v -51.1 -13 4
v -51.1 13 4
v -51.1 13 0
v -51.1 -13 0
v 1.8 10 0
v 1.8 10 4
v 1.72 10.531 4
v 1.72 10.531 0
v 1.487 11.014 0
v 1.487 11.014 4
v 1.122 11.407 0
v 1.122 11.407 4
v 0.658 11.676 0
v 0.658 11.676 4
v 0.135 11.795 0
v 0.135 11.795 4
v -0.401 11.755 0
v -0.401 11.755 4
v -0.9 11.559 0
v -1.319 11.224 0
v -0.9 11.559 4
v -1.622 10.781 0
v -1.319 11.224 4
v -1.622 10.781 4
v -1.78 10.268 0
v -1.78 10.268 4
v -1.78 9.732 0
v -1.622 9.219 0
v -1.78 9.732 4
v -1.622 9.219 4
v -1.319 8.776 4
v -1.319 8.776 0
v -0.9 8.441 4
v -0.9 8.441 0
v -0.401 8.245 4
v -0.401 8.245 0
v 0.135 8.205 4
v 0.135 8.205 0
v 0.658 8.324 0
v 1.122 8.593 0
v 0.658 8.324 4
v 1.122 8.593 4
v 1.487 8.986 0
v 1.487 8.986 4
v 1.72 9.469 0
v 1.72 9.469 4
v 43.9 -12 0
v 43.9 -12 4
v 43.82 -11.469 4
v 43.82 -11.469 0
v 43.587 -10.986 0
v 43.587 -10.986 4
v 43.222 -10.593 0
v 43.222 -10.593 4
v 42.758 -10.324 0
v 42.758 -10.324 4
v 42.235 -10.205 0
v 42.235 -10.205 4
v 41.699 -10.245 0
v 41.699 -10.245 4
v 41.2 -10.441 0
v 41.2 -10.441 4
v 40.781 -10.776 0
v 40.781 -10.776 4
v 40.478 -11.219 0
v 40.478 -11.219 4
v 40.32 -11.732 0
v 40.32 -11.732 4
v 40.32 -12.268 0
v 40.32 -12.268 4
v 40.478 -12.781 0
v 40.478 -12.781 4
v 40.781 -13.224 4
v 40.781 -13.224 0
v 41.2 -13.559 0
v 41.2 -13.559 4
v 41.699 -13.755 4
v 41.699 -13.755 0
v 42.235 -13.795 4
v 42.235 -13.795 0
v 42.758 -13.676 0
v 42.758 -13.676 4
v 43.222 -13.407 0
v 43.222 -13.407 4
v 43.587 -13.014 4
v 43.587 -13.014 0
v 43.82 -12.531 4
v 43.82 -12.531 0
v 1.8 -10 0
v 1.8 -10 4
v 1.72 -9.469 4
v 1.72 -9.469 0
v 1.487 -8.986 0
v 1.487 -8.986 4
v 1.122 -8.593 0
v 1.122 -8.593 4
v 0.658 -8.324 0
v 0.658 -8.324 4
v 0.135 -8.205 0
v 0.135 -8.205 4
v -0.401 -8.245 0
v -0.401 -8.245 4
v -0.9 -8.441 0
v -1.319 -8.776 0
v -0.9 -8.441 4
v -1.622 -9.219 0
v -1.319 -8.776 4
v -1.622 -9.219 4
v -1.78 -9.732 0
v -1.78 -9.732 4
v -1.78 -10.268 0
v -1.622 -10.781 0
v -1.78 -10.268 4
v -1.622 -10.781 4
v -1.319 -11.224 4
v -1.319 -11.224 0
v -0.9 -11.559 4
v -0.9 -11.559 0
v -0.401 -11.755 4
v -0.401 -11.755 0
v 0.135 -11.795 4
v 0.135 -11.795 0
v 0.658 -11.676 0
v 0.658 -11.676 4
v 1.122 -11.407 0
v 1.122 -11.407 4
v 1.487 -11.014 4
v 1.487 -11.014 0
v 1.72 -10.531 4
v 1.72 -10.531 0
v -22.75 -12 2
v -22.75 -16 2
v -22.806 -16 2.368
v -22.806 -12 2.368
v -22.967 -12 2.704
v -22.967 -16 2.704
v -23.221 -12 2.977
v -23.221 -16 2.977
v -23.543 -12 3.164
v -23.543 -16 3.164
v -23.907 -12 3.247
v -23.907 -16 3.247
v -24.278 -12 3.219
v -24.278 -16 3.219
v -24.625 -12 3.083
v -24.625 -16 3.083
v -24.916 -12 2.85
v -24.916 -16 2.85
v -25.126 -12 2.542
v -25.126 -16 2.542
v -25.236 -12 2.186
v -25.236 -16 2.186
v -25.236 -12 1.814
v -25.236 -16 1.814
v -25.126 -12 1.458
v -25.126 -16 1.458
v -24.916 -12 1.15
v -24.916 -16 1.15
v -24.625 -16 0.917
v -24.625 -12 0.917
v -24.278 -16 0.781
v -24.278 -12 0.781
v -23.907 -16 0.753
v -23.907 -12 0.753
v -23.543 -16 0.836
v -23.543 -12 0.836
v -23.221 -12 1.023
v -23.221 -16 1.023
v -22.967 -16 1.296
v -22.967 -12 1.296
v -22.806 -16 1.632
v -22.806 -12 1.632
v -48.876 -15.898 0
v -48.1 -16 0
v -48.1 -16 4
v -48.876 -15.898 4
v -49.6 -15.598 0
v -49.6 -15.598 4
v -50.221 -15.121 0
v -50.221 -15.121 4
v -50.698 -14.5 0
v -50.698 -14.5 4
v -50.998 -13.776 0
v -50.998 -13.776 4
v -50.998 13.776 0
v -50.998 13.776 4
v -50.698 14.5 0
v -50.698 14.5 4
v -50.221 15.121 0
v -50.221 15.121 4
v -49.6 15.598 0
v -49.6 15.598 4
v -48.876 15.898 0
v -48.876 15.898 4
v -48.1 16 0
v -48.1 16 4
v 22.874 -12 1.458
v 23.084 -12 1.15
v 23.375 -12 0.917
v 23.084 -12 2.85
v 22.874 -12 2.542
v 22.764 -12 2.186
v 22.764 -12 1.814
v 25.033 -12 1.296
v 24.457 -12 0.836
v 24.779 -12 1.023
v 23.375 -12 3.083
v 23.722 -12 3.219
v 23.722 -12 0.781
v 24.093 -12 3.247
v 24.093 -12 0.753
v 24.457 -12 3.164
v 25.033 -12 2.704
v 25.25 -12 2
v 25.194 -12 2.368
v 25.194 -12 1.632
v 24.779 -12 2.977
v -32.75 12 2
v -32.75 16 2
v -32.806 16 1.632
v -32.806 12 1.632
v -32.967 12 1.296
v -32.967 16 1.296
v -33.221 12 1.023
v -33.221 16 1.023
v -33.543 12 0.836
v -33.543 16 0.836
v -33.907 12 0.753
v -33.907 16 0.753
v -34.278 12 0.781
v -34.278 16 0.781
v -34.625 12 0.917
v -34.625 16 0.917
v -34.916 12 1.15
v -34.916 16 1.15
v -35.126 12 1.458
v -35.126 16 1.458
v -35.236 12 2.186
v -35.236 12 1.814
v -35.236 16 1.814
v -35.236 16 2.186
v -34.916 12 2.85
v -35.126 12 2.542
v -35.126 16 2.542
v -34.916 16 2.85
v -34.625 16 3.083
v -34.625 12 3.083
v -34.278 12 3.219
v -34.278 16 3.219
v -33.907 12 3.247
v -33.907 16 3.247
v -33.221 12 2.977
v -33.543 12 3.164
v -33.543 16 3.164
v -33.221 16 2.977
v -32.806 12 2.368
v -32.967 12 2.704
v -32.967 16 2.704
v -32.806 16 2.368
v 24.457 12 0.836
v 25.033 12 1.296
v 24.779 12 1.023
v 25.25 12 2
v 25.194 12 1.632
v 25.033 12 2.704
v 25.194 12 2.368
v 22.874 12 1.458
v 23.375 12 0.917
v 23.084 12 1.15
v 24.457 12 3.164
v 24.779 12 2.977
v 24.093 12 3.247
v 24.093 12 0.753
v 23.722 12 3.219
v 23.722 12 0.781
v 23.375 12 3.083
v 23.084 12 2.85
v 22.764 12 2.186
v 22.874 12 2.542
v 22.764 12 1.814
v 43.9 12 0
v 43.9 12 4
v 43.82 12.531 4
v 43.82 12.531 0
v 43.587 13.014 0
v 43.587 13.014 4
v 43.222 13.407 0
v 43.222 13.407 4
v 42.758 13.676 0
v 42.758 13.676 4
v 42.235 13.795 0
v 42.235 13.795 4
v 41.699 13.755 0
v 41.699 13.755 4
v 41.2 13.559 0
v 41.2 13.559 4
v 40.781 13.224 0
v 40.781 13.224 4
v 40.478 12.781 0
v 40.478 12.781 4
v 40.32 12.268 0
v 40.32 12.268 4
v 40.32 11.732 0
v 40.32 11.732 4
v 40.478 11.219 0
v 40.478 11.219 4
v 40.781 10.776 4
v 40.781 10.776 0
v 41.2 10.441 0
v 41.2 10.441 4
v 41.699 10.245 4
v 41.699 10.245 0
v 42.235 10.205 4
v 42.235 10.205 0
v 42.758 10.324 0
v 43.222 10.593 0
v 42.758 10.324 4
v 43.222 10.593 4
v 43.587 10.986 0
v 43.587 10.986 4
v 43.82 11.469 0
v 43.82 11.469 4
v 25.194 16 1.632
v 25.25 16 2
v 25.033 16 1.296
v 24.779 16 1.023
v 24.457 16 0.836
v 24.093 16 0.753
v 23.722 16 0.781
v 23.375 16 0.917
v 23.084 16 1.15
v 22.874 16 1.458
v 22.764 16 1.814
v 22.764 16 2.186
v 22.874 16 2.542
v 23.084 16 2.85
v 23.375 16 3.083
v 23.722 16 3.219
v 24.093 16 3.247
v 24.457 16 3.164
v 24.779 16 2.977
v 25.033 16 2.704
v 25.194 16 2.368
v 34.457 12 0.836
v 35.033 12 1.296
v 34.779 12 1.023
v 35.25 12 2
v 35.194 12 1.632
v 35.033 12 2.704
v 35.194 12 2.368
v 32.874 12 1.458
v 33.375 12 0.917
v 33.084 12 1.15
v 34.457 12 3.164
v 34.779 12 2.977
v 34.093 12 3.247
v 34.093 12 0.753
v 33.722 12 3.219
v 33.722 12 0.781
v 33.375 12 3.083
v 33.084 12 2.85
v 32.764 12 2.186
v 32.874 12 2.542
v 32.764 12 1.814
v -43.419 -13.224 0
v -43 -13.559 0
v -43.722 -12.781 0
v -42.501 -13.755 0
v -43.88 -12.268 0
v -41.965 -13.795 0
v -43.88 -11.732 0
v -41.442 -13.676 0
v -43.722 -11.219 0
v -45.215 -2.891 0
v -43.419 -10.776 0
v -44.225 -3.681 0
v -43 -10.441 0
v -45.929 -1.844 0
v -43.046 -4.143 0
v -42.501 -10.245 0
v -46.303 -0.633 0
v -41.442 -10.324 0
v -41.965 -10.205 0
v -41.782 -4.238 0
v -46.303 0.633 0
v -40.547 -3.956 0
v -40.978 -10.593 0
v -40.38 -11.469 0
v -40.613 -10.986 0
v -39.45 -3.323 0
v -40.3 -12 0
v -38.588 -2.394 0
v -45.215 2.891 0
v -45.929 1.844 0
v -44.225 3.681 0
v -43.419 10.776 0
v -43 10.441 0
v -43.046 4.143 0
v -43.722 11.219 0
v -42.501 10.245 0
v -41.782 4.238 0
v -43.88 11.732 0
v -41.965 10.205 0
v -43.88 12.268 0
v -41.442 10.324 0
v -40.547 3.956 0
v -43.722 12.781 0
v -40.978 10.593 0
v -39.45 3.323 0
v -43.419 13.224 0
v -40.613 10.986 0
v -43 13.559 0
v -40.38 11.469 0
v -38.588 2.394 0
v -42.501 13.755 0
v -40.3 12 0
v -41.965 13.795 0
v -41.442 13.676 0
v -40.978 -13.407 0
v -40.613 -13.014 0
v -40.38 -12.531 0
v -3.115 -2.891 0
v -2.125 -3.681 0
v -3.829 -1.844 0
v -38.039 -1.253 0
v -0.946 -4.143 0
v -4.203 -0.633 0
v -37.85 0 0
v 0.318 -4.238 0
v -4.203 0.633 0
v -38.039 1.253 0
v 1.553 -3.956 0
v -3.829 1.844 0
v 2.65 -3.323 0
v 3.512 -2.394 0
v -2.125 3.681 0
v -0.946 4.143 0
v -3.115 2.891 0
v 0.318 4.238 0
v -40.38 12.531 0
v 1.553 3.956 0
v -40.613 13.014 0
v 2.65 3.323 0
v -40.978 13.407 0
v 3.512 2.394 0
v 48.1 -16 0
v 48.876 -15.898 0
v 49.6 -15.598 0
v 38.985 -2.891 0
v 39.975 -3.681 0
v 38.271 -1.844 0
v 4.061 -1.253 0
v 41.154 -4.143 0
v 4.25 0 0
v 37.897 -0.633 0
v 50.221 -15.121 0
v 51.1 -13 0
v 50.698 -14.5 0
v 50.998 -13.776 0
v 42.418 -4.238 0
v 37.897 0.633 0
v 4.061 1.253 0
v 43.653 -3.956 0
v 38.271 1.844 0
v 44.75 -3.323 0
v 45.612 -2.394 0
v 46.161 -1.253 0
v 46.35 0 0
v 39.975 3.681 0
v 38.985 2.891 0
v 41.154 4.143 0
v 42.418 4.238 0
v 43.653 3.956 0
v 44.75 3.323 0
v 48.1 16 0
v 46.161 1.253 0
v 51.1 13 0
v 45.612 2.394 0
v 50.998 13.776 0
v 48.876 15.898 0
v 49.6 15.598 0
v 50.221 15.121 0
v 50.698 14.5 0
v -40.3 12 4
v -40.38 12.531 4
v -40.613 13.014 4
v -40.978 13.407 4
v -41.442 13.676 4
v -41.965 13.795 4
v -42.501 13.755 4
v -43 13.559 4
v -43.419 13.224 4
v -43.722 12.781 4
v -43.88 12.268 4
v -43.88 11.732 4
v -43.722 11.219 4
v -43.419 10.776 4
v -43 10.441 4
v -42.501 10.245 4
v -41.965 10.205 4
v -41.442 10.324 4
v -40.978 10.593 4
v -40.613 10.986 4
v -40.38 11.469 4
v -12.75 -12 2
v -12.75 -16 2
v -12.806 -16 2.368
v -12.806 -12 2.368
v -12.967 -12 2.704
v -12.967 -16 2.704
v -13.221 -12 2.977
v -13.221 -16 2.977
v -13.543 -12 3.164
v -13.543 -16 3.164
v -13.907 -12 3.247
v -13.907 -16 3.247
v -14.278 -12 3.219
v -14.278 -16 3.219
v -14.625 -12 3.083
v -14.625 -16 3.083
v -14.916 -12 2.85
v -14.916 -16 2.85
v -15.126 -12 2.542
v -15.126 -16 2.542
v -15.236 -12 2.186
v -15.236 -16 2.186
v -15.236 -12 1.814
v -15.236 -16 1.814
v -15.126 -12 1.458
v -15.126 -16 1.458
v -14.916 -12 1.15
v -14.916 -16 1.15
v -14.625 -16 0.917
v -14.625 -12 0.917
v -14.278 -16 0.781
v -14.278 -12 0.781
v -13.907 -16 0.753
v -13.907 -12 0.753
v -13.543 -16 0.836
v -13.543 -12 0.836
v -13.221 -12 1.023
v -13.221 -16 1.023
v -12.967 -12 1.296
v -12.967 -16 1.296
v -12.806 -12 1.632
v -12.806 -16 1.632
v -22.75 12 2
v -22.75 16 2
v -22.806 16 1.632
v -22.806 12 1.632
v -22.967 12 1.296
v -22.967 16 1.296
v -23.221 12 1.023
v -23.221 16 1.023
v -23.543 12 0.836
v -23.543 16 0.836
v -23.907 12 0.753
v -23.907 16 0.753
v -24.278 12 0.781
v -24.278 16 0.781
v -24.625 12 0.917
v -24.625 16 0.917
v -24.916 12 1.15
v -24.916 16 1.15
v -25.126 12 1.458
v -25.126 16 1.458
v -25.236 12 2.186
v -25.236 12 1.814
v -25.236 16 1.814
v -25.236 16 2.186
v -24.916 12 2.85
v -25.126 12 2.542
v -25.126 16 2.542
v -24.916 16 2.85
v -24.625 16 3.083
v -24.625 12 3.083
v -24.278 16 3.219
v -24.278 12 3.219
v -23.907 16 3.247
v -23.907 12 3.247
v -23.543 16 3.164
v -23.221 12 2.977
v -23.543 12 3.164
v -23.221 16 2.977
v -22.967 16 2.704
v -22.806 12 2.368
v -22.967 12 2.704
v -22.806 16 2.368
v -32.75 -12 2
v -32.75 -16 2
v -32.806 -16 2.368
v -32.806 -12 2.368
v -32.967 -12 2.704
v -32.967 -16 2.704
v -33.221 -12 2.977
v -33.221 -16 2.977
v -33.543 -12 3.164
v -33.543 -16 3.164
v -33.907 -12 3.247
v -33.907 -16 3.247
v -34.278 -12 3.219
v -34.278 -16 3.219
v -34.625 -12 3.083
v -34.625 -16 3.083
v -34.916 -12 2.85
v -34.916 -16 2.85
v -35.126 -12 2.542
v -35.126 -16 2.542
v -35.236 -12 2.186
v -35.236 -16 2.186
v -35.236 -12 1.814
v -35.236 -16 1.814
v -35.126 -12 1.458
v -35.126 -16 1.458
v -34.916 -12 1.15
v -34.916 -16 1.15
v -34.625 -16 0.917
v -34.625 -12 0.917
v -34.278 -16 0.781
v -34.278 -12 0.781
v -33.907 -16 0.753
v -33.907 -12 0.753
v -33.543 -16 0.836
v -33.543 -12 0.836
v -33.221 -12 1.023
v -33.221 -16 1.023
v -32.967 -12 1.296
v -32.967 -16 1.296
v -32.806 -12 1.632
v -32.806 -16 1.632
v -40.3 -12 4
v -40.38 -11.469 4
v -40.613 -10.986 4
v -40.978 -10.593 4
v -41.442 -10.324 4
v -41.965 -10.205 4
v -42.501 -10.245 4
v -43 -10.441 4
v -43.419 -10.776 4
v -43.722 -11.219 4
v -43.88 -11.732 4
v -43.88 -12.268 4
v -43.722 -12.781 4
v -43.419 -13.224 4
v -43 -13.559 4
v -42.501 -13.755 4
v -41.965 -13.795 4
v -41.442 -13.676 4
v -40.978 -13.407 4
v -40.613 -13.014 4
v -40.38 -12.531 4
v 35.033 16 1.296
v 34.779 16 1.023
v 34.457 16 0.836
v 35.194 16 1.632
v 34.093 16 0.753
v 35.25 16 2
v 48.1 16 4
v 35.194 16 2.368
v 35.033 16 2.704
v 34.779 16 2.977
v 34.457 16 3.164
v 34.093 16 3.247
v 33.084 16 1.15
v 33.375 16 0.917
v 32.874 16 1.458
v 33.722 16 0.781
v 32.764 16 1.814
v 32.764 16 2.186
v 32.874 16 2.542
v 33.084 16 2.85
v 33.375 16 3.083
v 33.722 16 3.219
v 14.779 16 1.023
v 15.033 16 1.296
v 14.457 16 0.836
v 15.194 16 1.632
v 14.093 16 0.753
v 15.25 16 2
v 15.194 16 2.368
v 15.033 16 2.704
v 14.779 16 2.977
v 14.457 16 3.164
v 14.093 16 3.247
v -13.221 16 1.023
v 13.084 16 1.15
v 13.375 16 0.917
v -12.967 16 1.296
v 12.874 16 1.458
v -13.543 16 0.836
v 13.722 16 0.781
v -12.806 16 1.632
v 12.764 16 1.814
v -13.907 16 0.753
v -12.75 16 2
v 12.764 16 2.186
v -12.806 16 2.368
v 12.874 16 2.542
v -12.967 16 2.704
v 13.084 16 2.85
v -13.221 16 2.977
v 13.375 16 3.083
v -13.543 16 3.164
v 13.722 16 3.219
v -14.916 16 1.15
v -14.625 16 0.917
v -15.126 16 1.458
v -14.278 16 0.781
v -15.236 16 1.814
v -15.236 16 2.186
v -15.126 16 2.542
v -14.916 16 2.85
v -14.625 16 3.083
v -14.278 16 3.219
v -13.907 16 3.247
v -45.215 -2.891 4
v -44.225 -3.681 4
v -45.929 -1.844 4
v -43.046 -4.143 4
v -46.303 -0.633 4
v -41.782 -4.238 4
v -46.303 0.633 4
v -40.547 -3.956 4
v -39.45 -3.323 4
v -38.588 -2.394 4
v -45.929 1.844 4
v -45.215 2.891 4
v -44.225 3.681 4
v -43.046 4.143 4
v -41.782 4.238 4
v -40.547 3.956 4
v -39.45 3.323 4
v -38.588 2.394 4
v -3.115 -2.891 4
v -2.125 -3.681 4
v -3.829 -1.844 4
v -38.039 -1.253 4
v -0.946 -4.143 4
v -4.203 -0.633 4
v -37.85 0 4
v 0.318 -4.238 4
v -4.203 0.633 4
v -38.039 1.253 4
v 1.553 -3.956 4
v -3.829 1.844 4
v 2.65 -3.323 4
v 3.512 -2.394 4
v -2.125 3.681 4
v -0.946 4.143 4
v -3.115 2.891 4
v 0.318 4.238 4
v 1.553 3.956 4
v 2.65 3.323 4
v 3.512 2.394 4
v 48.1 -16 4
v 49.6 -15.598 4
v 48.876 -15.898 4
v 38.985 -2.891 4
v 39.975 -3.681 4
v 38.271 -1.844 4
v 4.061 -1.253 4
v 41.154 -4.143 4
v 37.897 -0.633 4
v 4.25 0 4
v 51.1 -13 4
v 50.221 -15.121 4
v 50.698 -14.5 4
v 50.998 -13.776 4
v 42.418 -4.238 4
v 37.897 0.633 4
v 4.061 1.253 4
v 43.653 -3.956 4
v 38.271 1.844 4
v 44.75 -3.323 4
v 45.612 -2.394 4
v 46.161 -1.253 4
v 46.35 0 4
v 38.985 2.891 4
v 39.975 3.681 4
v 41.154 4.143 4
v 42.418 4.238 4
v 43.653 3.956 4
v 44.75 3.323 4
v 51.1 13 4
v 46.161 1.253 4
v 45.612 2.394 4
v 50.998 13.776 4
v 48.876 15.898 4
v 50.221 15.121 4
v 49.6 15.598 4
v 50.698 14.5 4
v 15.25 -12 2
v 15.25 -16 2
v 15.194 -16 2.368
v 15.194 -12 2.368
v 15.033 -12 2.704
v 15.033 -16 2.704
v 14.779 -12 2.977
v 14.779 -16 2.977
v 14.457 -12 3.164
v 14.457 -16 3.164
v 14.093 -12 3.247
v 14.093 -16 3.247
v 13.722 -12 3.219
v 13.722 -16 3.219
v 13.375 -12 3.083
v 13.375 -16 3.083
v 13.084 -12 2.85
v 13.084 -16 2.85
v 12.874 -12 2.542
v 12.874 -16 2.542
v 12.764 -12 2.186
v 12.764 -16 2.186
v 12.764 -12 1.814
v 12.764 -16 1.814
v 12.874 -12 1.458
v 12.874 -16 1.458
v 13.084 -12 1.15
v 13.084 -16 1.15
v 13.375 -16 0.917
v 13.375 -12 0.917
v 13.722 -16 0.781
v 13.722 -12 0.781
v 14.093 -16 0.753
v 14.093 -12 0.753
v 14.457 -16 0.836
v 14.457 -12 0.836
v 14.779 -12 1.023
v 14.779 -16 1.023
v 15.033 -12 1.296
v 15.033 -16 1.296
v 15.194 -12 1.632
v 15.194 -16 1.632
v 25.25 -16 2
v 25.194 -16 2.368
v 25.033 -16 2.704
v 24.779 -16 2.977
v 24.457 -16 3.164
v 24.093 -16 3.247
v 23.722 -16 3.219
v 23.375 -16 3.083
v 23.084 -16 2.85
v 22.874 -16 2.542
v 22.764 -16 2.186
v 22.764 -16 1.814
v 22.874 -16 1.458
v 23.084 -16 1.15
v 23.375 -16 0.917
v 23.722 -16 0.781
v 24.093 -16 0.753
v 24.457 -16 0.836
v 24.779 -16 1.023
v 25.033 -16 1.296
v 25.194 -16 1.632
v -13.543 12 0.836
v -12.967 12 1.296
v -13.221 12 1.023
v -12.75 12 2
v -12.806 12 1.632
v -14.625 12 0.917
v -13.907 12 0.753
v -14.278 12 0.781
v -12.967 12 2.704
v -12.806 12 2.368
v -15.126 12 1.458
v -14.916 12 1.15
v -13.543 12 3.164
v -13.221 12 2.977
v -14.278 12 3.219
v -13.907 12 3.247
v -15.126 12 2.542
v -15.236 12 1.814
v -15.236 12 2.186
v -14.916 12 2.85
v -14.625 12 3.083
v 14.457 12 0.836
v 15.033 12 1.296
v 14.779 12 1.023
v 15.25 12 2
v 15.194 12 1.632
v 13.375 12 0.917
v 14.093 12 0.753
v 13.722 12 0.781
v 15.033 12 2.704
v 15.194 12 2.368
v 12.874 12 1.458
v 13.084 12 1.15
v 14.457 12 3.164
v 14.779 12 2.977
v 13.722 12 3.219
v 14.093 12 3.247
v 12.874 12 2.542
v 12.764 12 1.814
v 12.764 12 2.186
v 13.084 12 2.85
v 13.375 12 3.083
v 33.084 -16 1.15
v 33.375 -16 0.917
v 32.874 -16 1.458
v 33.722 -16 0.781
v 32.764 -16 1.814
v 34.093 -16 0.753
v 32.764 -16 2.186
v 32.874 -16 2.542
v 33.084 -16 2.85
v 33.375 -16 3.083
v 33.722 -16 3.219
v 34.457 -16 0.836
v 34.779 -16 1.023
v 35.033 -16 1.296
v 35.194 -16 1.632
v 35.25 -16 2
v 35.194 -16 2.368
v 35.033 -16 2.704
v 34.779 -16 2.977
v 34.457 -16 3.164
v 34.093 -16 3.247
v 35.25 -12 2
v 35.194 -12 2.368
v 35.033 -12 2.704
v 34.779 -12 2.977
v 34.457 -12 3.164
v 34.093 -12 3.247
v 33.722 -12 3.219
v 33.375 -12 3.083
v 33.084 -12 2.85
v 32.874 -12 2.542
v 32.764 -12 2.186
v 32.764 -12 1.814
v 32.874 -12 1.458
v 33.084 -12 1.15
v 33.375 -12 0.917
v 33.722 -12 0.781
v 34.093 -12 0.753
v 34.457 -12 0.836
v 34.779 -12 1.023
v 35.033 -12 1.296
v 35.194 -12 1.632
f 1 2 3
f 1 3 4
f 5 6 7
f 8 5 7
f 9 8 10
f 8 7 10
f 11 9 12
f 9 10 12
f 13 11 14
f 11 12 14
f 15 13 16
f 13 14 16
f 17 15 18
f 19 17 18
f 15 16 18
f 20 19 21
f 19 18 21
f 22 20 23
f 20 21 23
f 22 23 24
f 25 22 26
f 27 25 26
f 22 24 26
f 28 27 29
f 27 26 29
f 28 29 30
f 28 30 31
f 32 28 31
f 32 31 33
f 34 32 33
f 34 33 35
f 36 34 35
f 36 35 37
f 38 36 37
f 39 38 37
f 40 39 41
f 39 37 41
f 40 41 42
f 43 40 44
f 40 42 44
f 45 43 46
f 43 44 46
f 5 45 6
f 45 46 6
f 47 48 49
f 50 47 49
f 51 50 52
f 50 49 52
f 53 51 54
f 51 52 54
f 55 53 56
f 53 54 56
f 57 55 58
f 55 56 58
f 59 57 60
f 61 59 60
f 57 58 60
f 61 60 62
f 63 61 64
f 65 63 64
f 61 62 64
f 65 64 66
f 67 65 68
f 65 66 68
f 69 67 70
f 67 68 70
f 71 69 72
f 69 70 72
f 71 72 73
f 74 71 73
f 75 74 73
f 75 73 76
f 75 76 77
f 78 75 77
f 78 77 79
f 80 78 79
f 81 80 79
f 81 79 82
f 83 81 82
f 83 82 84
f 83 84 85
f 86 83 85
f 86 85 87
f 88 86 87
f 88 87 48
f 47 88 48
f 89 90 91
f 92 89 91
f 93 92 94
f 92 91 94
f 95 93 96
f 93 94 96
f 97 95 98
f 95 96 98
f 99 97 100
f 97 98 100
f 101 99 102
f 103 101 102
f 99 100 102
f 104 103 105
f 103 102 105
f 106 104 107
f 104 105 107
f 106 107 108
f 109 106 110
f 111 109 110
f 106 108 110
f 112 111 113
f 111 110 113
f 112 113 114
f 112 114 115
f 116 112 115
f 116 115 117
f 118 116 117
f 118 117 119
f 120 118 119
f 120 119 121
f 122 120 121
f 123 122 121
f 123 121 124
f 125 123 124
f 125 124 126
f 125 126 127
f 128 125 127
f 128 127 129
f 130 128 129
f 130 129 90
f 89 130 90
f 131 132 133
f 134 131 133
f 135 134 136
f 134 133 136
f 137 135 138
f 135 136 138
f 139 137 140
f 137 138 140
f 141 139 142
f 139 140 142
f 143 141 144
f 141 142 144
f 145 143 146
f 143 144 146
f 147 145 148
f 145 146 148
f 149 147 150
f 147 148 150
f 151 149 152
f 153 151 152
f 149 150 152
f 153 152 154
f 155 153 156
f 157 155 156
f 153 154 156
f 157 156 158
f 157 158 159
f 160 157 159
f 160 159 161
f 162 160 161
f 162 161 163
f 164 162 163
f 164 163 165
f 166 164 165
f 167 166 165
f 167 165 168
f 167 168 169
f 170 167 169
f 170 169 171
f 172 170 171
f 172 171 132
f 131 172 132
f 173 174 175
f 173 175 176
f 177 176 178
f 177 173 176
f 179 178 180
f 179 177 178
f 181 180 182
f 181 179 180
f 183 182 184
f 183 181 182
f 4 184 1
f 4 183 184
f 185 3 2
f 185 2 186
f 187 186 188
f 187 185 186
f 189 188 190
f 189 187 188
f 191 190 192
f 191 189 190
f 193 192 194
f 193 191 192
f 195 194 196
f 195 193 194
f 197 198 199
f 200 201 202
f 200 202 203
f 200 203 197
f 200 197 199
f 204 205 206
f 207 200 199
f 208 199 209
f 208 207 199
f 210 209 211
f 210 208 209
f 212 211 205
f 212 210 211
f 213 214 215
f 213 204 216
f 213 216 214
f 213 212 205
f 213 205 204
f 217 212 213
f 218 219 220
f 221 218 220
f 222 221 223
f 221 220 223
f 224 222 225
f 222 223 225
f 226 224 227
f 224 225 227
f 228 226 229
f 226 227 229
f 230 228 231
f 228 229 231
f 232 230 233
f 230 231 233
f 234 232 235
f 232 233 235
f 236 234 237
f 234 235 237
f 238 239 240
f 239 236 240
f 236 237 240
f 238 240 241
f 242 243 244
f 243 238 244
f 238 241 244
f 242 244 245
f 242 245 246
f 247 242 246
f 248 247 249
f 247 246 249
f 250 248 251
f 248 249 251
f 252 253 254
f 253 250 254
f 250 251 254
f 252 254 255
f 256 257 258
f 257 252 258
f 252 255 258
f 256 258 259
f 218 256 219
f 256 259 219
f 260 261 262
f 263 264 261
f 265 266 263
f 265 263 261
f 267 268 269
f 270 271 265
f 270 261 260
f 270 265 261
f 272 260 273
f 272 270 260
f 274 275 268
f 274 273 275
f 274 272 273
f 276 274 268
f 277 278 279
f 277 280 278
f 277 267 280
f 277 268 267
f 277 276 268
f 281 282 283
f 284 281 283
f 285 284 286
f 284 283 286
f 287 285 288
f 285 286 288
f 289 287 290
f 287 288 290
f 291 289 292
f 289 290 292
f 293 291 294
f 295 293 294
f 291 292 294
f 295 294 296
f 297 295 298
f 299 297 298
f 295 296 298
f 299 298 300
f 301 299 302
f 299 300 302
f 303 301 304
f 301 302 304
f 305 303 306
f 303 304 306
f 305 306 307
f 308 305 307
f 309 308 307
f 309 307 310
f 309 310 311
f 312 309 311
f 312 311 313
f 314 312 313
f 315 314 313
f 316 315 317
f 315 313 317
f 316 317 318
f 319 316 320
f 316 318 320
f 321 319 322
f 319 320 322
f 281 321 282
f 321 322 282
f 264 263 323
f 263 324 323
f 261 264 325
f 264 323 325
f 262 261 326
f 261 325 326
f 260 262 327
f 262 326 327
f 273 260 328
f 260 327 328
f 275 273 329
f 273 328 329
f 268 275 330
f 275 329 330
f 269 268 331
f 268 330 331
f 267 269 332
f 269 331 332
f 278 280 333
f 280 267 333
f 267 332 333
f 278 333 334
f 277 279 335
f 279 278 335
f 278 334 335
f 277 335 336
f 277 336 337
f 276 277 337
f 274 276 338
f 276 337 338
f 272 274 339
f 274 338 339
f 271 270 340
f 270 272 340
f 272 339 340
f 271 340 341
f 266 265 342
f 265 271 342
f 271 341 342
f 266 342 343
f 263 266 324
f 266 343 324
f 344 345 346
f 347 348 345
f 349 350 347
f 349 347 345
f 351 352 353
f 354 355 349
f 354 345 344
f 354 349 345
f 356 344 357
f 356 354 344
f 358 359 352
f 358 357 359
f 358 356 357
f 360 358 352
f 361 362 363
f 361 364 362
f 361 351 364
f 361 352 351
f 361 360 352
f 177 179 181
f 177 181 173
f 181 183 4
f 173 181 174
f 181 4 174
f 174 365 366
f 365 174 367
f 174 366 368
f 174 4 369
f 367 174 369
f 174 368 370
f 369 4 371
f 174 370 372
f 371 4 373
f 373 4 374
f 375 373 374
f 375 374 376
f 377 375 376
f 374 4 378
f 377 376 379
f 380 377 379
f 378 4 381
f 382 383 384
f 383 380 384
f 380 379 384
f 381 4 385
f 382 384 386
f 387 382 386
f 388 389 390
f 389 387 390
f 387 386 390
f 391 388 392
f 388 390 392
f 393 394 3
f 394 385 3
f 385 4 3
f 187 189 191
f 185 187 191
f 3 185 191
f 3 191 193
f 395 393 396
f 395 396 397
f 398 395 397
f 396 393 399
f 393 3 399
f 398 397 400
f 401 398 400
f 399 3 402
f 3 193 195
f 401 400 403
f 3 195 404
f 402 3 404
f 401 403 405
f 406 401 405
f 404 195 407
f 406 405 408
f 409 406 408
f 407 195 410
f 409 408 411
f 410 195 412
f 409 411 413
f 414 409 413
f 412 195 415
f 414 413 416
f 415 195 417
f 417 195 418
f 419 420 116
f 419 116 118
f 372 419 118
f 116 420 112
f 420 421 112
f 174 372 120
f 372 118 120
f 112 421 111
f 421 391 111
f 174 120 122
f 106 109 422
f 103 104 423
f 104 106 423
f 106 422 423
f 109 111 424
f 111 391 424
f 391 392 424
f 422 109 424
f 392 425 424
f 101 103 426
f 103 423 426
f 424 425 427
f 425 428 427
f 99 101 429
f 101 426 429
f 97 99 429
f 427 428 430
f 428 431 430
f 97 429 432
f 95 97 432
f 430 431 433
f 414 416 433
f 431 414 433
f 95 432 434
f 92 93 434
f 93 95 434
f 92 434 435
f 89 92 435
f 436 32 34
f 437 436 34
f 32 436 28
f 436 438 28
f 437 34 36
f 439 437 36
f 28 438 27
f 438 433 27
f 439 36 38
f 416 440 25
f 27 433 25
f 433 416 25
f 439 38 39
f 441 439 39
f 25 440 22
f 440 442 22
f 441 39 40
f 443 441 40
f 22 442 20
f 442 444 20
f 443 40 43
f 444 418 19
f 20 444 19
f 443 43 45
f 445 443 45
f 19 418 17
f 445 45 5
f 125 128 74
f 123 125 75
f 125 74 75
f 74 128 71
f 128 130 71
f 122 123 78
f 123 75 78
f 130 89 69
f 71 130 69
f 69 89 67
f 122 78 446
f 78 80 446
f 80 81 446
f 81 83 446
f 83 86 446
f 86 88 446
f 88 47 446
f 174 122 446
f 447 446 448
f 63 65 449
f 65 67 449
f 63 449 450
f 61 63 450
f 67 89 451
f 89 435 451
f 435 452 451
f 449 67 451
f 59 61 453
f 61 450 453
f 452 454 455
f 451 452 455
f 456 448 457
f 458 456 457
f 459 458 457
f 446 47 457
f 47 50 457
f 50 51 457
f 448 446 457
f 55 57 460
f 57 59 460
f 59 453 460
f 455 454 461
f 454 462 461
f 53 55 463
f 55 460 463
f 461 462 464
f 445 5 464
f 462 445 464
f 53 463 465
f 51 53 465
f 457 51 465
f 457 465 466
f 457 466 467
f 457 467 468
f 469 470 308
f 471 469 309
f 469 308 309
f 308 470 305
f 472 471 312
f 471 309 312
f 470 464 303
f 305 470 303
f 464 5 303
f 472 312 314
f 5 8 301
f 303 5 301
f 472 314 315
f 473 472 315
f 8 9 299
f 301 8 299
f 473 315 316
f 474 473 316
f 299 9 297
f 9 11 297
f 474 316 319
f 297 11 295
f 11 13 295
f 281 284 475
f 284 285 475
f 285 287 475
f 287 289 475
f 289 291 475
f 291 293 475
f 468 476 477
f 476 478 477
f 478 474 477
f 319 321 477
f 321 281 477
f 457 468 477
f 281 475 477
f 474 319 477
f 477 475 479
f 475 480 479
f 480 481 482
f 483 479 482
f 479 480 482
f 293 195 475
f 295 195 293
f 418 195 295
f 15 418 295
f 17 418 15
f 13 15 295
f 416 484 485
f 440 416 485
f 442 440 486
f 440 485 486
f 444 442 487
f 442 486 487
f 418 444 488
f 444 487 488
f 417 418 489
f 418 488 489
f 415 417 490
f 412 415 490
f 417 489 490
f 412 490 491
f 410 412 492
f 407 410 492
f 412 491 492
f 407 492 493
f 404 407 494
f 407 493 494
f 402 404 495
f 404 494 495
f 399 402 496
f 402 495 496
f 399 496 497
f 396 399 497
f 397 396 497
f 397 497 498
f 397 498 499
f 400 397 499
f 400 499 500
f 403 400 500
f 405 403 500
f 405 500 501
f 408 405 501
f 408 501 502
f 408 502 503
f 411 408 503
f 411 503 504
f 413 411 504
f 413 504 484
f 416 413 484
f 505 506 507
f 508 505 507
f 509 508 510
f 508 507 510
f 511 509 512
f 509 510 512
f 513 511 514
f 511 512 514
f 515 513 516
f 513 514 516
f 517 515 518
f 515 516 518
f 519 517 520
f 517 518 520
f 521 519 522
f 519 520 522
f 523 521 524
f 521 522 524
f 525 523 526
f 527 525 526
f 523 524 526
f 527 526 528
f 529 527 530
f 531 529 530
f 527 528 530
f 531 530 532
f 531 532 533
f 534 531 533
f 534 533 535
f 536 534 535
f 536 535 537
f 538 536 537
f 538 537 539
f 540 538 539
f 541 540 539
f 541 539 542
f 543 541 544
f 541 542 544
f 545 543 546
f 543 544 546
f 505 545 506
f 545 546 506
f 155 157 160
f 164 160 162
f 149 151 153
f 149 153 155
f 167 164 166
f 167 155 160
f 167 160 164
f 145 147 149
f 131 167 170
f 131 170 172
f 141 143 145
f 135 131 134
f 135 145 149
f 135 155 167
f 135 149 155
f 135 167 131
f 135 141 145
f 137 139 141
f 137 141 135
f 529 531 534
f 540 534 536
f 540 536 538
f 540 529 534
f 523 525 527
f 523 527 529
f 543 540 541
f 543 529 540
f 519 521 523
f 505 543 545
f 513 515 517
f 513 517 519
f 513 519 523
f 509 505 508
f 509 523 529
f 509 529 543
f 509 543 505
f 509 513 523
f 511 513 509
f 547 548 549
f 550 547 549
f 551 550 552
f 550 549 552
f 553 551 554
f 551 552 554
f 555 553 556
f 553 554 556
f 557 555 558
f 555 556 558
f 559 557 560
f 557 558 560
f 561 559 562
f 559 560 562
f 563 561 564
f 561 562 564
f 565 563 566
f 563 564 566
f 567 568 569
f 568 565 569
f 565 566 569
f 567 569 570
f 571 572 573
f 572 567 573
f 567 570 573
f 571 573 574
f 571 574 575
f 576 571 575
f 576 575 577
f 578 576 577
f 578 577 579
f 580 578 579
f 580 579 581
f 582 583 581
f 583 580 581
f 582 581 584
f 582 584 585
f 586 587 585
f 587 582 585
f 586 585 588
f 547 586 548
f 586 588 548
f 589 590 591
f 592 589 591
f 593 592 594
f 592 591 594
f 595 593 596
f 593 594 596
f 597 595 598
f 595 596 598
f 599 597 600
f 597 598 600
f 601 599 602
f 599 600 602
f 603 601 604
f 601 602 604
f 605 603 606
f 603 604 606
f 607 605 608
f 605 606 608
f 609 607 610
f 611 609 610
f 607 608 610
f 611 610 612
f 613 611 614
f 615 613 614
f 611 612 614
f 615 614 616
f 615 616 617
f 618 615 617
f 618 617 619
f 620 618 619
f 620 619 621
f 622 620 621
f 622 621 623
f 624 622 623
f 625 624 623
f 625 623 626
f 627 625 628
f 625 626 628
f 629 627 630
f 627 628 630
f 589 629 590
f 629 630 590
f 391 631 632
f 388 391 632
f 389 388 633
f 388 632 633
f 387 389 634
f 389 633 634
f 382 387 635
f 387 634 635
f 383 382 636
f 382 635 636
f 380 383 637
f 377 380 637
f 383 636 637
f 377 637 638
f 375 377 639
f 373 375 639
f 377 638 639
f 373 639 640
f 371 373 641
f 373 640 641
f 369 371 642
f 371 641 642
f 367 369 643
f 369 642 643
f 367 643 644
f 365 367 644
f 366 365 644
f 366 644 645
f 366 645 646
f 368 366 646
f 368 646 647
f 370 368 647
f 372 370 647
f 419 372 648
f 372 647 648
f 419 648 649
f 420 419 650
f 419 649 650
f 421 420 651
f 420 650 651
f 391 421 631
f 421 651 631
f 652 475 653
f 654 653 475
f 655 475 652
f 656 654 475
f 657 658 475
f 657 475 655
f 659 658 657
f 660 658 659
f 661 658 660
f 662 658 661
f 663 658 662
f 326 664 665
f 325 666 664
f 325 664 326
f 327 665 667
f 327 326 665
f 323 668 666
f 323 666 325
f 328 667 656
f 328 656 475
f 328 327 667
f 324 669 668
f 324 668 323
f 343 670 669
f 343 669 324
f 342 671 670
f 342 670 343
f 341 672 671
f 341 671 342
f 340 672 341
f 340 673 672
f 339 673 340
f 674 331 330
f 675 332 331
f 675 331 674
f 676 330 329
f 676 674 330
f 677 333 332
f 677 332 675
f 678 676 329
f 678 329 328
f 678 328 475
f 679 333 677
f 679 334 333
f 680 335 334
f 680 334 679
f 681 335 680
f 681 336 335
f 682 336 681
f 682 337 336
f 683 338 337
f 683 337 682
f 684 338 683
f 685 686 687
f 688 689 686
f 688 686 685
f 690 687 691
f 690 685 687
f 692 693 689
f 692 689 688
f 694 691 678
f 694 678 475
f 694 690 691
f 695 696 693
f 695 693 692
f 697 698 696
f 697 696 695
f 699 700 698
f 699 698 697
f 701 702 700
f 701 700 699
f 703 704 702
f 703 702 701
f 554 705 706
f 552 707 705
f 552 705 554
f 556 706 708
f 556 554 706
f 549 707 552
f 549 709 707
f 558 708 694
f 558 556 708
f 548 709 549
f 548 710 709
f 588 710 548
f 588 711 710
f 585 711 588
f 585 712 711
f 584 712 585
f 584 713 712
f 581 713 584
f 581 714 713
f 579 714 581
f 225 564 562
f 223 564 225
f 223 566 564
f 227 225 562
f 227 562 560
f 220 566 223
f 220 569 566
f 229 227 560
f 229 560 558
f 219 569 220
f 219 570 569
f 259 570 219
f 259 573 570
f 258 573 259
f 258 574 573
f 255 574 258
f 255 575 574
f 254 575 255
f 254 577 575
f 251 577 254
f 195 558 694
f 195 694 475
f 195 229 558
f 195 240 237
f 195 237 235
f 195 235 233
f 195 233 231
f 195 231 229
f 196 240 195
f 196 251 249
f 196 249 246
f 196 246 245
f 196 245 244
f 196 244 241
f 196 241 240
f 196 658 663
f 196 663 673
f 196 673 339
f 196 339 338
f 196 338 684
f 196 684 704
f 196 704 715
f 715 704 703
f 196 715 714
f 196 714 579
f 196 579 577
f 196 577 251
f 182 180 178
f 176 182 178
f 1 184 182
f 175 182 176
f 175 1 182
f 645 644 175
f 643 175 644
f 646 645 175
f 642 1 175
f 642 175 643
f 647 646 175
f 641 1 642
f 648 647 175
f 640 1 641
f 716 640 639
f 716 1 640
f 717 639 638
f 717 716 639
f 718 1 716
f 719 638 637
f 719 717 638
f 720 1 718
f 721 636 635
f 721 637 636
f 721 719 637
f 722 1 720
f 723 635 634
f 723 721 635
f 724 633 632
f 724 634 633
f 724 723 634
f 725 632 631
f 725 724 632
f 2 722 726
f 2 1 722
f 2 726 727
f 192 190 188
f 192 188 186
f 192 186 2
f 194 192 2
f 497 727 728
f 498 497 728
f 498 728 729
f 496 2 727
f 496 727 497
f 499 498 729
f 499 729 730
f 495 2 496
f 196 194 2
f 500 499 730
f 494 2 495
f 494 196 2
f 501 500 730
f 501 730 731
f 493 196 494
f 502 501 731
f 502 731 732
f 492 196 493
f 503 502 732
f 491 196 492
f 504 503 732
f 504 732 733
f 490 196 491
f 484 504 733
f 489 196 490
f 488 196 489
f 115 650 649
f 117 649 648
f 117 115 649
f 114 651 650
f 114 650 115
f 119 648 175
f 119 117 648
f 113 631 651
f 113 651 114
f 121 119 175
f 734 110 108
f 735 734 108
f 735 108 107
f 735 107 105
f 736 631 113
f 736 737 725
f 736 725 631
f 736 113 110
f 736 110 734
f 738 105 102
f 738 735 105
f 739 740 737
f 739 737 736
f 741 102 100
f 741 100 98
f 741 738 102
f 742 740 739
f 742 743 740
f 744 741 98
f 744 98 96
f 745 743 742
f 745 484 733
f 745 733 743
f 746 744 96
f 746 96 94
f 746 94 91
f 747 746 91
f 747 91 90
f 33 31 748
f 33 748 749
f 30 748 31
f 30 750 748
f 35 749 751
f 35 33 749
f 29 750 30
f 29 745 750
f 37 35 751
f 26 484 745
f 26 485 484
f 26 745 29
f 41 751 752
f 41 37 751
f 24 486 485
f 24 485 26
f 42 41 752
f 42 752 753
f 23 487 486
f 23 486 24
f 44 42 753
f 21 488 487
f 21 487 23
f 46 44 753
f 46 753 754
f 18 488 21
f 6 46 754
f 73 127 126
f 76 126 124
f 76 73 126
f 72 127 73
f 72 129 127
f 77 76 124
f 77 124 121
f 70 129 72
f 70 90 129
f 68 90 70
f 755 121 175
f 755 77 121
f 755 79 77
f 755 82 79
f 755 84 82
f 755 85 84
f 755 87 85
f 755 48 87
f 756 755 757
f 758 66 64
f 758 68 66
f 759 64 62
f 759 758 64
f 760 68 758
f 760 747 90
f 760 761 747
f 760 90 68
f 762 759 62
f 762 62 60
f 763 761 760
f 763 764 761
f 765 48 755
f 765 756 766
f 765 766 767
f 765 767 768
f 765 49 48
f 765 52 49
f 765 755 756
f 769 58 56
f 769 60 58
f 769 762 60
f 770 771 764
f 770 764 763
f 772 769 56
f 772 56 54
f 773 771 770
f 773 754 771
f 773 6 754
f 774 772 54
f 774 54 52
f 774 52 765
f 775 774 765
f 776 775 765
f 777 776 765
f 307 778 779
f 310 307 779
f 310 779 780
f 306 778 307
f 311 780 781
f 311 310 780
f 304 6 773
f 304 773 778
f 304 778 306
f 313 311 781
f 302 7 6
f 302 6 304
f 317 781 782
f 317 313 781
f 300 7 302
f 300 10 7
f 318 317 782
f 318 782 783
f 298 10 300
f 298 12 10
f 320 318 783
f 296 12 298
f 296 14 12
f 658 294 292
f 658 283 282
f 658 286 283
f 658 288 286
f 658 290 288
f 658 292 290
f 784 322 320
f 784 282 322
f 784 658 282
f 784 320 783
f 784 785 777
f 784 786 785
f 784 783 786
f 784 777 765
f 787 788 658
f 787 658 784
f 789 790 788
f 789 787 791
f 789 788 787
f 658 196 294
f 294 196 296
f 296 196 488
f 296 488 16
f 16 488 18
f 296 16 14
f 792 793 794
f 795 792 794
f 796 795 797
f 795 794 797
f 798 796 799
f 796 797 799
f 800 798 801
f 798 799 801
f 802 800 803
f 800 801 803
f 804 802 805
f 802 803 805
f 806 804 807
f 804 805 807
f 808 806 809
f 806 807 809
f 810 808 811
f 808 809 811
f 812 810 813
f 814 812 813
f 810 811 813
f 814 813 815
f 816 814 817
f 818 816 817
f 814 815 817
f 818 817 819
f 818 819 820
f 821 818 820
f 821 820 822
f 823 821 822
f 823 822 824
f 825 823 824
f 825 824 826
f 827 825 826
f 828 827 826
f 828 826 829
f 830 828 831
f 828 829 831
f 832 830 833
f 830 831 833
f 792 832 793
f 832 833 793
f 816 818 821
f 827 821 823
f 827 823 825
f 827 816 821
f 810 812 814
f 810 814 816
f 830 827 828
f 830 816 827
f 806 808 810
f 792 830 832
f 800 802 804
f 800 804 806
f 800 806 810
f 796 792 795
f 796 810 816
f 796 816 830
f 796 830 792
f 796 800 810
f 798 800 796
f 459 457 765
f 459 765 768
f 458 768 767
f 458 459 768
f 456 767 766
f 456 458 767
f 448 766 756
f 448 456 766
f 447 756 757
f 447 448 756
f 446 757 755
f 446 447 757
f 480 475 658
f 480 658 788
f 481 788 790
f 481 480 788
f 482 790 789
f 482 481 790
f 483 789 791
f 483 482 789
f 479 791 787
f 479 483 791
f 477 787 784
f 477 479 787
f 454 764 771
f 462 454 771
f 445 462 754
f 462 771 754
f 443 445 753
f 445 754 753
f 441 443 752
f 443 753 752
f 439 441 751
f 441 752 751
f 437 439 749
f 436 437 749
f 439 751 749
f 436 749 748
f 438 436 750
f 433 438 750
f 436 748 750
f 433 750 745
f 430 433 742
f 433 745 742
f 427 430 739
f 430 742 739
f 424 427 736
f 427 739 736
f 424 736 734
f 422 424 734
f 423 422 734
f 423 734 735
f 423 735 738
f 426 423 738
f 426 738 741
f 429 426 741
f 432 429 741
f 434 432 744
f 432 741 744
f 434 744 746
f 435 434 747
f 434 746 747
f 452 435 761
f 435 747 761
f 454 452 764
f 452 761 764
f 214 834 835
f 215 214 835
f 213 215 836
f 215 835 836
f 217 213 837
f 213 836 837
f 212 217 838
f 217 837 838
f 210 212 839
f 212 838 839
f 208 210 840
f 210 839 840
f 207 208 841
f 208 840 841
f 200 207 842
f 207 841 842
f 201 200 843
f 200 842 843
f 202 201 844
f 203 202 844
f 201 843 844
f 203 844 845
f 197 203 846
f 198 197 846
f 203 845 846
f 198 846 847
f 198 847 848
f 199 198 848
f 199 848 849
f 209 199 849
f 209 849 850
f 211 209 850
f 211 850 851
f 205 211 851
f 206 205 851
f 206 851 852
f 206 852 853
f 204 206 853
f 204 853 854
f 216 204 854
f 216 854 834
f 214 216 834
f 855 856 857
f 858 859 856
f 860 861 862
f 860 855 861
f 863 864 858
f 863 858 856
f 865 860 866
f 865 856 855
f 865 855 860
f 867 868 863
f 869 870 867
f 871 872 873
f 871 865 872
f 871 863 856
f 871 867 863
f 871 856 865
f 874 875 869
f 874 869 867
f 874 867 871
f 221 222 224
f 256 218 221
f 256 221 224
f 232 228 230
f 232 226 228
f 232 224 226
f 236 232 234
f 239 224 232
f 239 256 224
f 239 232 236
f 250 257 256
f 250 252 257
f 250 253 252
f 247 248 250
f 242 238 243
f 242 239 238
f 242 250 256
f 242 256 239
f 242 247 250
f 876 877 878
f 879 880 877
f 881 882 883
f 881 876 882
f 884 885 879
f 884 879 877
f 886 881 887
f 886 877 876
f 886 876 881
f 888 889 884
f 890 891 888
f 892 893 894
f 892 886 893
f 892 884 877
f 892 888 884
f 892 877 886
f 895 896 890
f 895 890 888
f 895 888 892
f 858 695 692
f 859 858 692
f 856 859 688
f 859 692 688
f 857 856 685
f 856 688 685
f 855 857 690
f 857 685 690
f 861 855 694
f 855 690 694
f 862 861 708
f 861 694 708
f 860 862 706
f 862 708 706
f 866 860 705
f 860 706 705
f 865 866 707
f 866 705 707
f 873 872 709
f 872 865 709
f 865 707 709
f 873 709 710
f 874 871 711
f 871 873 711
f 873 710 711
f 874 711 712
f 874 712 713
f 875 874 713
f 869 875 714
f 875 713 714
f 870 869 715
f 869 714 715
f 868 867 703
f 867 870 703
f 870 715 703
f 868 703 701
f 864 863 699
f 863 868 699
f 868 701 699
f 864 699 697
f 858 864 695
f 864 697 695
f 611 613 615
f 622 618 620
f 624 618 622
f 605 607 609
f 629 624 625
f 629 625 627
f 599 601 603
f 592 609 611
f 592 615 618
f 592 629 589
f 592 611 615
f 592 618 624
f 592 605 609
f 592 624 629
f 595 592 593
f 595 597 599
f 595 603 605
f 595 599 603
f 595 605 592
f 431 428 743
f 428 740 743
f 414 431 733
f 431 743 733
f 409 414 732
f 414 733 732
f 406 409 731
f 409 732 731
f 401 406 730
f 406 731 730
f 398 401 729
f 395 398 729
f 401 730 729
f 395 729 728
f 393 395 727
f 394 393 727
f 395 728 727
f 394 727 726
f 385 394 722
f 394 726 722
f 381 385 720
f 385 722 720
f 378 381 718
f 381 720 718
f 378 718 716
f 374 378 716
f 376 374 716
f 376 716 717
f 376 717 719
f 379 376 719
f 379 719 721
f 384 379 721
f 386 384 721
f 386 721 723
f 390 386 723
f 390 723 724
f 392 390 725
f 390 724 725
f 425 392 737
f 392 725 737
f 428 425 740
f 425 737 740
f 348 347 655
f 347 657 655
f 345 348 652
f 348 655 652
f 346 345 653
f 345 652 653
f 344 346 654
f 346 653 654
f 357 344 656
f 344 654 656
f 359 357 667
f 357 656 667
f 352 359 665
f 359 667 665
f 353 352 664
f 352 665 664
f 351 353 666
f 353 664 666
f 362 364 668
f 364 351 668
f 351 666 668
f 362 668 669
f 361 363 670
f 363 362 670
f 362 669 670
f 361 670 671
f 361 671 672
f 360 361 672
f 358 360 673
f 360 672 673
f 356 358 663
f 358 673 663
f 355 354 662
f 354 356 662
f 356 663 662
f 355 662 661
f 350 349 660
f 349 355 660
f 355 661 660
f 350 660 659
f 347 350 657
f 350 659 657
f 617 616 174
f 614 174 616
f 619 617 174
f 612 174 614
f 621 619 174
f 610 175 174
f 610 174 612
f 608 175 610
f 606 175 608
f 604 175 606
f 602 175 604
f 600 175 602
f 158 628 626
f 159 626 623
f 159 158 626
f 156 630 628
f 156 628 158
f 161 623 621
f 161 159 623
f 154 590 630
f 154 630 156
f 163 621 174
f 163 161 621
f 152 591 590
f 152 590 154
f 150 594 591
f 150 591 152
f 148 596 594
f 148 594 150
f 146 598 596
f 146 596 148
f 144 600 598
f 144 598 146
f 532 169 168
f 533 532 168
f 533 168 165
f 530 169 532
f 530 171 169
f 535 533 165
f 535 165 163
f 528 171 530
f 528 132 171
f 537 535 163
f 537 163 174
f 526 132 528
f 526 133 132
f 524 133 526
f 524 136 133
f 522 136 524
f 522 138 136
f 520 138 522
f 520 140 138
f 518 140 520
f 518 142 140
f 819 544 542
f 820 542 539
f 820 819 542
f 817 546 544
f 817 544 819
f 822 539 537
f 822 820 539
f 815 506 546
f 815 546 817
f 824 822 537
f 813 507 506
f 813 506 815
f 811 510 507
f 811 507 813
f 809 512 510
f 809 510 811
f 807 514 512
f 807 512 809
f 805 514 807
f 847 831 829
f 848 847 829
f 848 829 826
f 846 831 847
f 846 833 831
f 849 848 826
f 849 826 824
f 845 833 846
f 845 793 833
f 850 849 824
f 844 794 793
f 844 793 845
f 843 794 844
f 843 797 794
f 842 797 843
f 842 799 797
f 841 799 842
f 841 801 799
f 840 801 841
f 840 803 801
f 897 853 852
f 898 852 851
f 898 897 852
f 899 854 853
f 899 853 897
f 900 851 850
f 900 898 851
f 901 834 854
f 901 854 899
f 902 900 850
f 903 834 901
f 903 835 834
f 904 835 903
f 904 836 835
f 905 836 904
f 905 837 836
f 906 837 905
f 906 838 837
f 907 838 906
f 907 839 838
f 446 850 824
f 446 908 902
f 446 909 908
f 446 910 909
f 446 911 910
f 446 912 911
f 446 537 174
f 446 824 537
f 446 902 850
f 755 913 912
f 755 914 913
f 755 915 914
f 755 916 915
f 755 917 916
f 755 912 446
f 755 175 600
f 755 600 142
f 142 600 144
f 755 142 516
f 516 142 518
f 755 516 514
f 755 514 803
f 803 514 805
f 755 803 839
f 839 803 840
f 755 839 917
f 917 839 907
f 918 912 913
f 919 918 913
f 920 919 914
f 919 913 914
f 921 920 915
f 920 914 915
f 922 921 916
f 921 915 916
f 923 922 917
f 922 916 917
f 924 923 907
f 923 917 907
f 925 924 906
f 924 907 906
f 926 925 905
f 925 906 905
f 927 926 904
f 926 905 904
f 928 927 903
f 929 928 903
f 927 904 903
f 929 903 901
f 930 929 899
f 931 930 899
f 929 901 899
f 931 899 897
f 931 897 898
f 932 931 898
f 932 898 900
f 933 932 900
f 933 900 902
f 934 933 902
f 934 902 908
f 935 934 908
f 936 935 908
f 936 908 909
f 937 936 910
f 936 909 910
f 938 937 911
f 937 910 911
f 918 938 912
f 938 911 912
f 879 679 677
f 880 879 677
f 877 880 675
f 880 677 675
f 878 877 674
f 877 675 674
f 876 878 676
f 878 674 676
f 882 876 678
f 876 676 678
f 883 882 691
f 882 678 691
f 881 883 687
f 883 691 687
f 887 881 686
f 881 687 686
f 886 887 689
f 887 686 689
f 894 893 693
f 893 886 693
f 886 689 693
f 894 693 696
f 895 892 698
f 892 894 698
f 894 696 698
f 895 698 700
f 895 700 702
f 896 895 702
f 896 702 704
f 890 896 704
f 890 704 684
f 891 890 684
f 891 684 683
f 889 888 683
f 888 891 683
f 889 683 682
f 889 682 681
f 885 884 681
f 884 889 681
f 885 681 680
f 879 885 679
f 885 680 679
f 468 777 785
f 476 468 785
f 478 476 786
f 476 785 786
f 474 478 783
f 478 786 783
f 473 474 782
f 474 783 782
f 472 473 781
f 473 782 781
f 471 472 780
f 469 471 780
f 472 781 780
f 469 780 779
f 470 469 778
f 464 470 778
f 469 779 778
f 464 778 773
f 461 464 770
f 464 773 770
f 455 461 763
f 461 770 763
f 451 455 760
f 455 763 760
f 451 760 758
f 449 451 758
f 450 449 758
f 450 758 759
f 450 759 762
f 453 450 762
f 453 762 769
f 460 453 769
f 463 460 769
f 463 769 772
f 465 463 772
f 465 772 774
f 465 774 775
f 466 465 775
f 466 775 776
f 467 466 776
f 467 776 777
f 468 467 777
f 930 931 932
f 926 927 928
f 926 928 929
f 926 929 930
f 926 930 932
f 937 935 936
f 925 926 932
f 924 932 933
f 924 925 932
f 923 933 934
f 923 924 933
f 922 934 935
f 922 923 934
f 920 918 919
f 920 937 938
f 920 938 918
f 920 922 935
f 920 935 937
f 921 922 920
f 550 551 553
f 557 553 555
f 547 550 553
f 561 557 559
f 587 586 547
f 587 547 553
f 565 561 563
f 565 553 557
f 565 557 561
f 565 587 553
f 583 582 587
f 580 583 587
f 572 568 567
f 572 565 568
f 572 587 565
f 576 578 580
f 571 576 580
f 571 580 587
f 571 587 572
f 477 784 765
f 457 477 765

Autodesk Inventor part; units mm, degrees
ref_plane "YZ Plane" through (0, 0, 0) normal (1, 0, 0) x (0, 1, 0)
ref_plane "XZ Plane" through (0, 0, 0) normal (0, 1, 0) x (-1, 0, 0)
ref_plane "XY Plane" through (0, 0, 0) normal (0, 0, 1) x (1, 0, 0)
sketch "스케치1" plane through (0, 0, 0) normal (0, 0, 1) x (1, 0, 0)
  line L0 (-48.1, 15) -> (48.1, 15)
  line L1 (48.1, 15) -> (48.1, -15)
  line L2 (48.1, -15) -> (-48.1, -15)
  line L3 (-48.1, -15) -> (-48.1, 15)
  line L4 (-48.1, 15) -> (48.1, -15) construction
  line L5 (48.1, 15) -> (-48.1, -15) construction
  point P0 (0, 0)
  dimension "d0" = 96.2
  dimension "d1" = 30
extrude "돌출1" add sketch "스케치1" along normal blind 4
sketch "스케치2" plane through (0, 0, 4) normal (0, 0, 1) x (1, 0, 0)
  circle A0 centre (42.1, 0) radius 4.25
  circle A1 centre (-42.1, 0) radius 4.25
  arc A2 (-46.1, 15) -> (-48.1, 13) centre (-46.1, 13) ccw
  line L0 (-48.1, 13) -> (-48.1, -13)
  arc A3 (-48.1, -13) -> (-46.1, -15) centre (-46.1, -13) ccw
  line L1 (-46.1, -15) -> (46.1, -15)
  arc A4 (46.1, -15) -> (48.1, -13) centre (46.1, -13) ccw
  line L2 (48.1, -13) -> (48.1, 13)
  arc A5 (48.1, 13) -> (46.1, 15) centre (46.1, 13) ccw
  line L3 (46.1, 15) -> (-46.1, 15)
  circle A6 centre (12, 0) radius 1.35
  circle A7 centre (0, 12) radius 1.35
  circle A8 centre (-12, 0) radius 1.35
  circle A9 centre (42.1, -12) radius 1.8
  circle A10 centre (-42.1, -12) radius 1.8
  circle A11 centre (42.1, 12) radius 1.8
  circle A12 centre (-42.1, 12) radius 1.8
  line L4 (-48.1, -15) -> (48.1, -15) projected
  line L5 (48.1, -15) -> (48.1, 15) projected
  line L6 (48.1, 15) -> (-48.1, 15) projected
  line L7 (-48.1, 15) -> (-48.1, -15) projected
  point P0 (0, 0)
  point P1 (0, 0)
  point P2 (48.1, -13)
  point P3 (-48.1, 13)
  dimension "d4" = 8.5
  dimension "d5" = 92.2
  dimension "d6" = 26
  dimension "d7" = 8.5
  dimension "d8" = 15
  dimension "d9" = 15
  dimension "d10" = 6
  dimension "d11" = 6
  dimension "d12" = 12
  dimension "d13" = 12
  dimension "d14" = 3.6
  dimension "d15" = 3.6
  dimension "d16" = 3.6
  dimension "d17" = 3.6
  dimension "d18" = 12
  dimension "d19" = 12
  dimension "d20" = 2.7
  dimension "d21" = 2.7
  dimension "d22" = 2.7
  dimension "d25" = 12
  dimension "d26" = 24
extrude "돌출2" cut sketch "스케치2" against normal blind 4 contours A0 | A1 | A2 L7 L6 | L6 L5 A5 | A3 L4 L7 | L5 L4 A4 | A6 | A7 | A8 | A9 | A10 | A11 | A12
sketch "스케치3" plane through (0, 0, 4) normal (0, 0, 1) x (1, 0, 0)
  circle A0 centre (-12, 0) radius 1.35 projected
  circle A1 centre (42.1, 0) radius 4.25 projected
  circle A2 centre (-42.1, -12) radius 1.8 projected
  circle A3 centre (42.1, 12) radius 1.8 projected
  circle A4 centre (0, 12) radius 1.35 projected
  circle A5 centre (-42.1, 0) radius 4.25 projected
  circle A6 centre (-42.1, 12) radius 1.8 projected
  circle A7 centre (42.1, -12) radius 1.8 projected
  circle A8 centre (12, 0) radius 1.35 projected
  arc A9 (46.1, -15) -> (48.1, -13) centre (46.1, -13) ccw projected
  line L0 (48.1, -13) -> (48.1, 13) projected
  arc A10 (48.1, 13) -> (46.1, 15) centre (46.1, 13) ccw projected
  line L1 (46.1, 15) -> (-46.1, 15) projected
  arc A11 (-46.1, 15) -> (-48.1, 13) centre (-46.1, 13) ccw projected
  line L2 (-48.1, 13) -> (-48.1, -13) projected
  arc A12 (-48.1, -13) -> (-46.1, -15) centre (-46.1, -13) ccw projected
  line L3 (-46.1, -15) -> (46.1, -15) projected
  line L4 (-48.1, 13) -> (-48.1, -13) projected
  line L5 (-48.1, 13) -> (-48.1, 16)
  arc A13 (48.1, 13) -> (46.1, 15) centre (46.1, 13) ccw projected
  line L6 (48.1, 13) -> (48.1, 16)
  line L7 (48.1, 16) -> (-48.1, 16)
  line L8 (48.1, -13) -> (48.1, 13) projected
  line L9 (48.1, -13) -> (48.1, -16)
  line L10 (-48.1, -13) -> (-48.1, -16)
  line L11 (-48.1, -16) -> (48.1, -16)
  point P0 (0, 0)
  dimension "d29" = 3
  dimension "d30" = 3
  dimension "d31" = 3
  dimension "d32" = 3
extrude "돌출3" add sketch "스케치3" against normal blind 4 contours A9 L9 L11 L10 A12 L3 | A10 L1 A11 L5 L7 L6
fillet "모깎기1" radius 3 4 edges at (-48.1, -16, 2) (48.1, -16, 2) (48.1, 16, 2) (-48.1, 16, 2)
sketch "스케치4" plane through (0, 0, 4) normal (0, 0, 1) x (1, 0, 0)
  arc A0 (-45.1, 16) -> (-48.1, 13) centre (-45.1, 13) ccw projected
  line L0 (-48.1, 13) -> (-48.1, -13) projected
  arc A1 (-48.1, -13) -> (-45.1, -16) centre (-45.1, -13) ccw projected
  line L1 (-45.1, -16) -> (45.1, -16) projected
  arc A2 (45.1, -16) -> (48.1, -13) centre (45.1, -13) ccw projected
  line L2 (48.1, -13) -> (48.1, 13) projected
  arc A3 (48.1, 13) -> (45.1, 16) centre (45.1, 13) ccw projected
  line L3 (45.1, 16) -> (-45.1, 16) projected
  circle A4 centre (-12, 0) radius 1.35 projected
  circle A5 centre (42.1, 0) radius 4.25 projected
  circle A6 centre (-42.1, -12) radius 1.8 projected
  circle A7 centre (42.1, 12) radius 1.8 projected
  circle A8 centre (0, 12) radius 1.35 projected
  circle A9 centre (-42.1, 0) radius 4.25 projected
  circle A10 centre (-42.1, 12) radius 1.8 projected
  circle A11 centre (42.1, -12) radius 1.8 projected
  circle A12 centre (12, 0) radius 1.35 projected
  line L4 (45.1, 16) -> (-45.1, 16) projected
  line L5 (-45.1, 16) -> (-51.1, 16)
  arc A13 (-45.1, 16) -> (-48.1, 13) centre (-45.1, 13) ccw projected
  line L6 (-51.1, 16) -> (-51.1, -16)
  line L7 (-45.1, -16) -> (45.1, -16) projected
  line L8 (-51.1, -16) -> (-45.1, -16)
  line L9 (45.1, 16) -> (51.1, 16)
  line L10 (51.1, 16) -> (51.1, -16)
  line L11 (51.1, -16) -> (45.1, -16)
  point P0 (0, 0)
  dimension "d36" = 6
  dimension "d37" = 6
extrude "돌출4" add sketch "스케치4" against normal blind 4 contours A0 L0 A1 L8 L6 L5 | L9 L10 L11 A2 L2 A3
fillet "모깎기2" radius 3 4 edges at (-51.1, -16, 2) (-51.1, 16, 2) (51.1, 16, 2) (51.1, -16, 2)
sketch "스케치5" plane through (0, 0, 4) normal (0, 0, 1) x (1, 0, 0)
  circle A0 centre (0, 0) radius 4.25
  dimension "d41" = 8.5
extrude "돌출5" cut sketch "스케치5" against normal blind 4
sketch "스케치6" plane through (0, 0, 4) normal (0, 0, 1) x (1, 0, 0)
  line L0 (0, 0) -> (0, 10)
  circle A0 centre (0, 0) radius 4.25 projected
  line L1 (0, 0) -> (0, -10)
  circle A1 centre (0, 10) radius 1.8
  circle A2 centre (0, -10) radius 1.8
  circle A3 centre (0, 0) radius 4.25 projected
  arc A4 (48.1, -16) -> (51.1, -13) centre (48.1, -13) ccw projected
  line L2 (51.1, -13) -> (51.1, 13) projected
  arc A5 (51.1, 13) -> (48.1, 16) centre (48.1, 13) ccw projected
  line L3 (48.1, 16) -> (-48.1, 16) projected
  arc A6 (-48.1, 16) -> (-51.1, 13) centre (-48.1, 13) ccw projected
  line L4 (-51.1, 13) -> (-51.1, -13) projected
  arc A7 (-51.1, -13) -> (-48.1, -16) centre (-48.1, -13) ccw projected
  line L5 (-48.1, -16) -> (48.1, -16) projected
  circle A8 centre (-12, 0) radius 1.35 projected
  circle A9 centre (42.1, 0) radius 4.25 projected
  circle A10 centre (-42.1, -12) radius 1.8 projected
  circle A11 centre (42.1, 12) radius 1.8 projected
  circle A12 centre (0, 12) radius 1.35 projected
  circle A13 centre (-42.1, 0) radius 4.25 projected
  circle A14 centre (-42.1, 12) radius 1.8 projected
  circle A15 centre (42.1, -12) radius 1.8 projected
  circle A16 centre (12, 0) radius 1.35 projected
  dimension "d44" = 10
  dimension "d45" = 10
  dimension "d46" = 3.6
  dimension "d47" = 3.6
extrude "돌출6" add sketch "스케치6" against normal blind 4 contours A12 A1 | A1 A12 | A8 | A16 picked at (0.3966, 12.2209) picked at (0.1959, 11.4027)
extrude "돌출7" cut sketch "스케치6" against normal blind 4 contours A1 A12 | A2 | A1 A12 picked at (-0.1974, 9.0374) picked at (0.1959, 11.4027)
sketch "스케치8" plane through (-48.1, -16, 4) normal (0, -1, 0) x (1, 0, 0)
  line L0 (96.2, 0) -> (96.2, -4) projected
  line L1 (0, 0) -> (96.2, 0) projected
  line L2 (0, -4) -> (0, 0) projected
  line L3 (96.2, -4) -> (0, -4) projected
  line L4 (96.2, -4) -> (96.2, 0) projected
  line L5 (96.2, -2) -> (0, -2) construction
  line L6 (0, -4) -> (0, 0) projected
  line L7 (48.1, -4) -> (48.1, 0) construction
  circle A0 centre (34.1, -2) radius 1.25
  circle A1 centre (24.1, -2) radius 1.25
  circle A2 centre (14.1, -2) radius 1.25
  circle A3 centre (62.1, -2) radius 1.25
  circle A4 centre (72.1, -2) radius 1.25
  circle A5 centre (82.1, -2) radius 1.25
  point P0 (48.1, -2)
  dimension "d53" = 2.5
  dimension "d54" = 2.5
  dimension "d55" = 2.5
  dimension "d56" = 2.5
  dimension "d57" = 2.5
  dimension "d58" = 2.5
  dimension "d59" = 14
  dimension "d60" = 10
  dimension "d61" = 10
  dimension "d63" = 10
  dimension "d64" = 10
  dimension "d67" = 14
extrude "돌출8" cut sketch "스케치8" against normal blind 4 contours A0 | A1 | A2 | A3 | A4 | A5
mirror "미러1" about plane through (0, 0, 0) normal (0, 1, 0) of "돌출8"
properties part number "스프링블럭2" material "알루미늄 6061"
